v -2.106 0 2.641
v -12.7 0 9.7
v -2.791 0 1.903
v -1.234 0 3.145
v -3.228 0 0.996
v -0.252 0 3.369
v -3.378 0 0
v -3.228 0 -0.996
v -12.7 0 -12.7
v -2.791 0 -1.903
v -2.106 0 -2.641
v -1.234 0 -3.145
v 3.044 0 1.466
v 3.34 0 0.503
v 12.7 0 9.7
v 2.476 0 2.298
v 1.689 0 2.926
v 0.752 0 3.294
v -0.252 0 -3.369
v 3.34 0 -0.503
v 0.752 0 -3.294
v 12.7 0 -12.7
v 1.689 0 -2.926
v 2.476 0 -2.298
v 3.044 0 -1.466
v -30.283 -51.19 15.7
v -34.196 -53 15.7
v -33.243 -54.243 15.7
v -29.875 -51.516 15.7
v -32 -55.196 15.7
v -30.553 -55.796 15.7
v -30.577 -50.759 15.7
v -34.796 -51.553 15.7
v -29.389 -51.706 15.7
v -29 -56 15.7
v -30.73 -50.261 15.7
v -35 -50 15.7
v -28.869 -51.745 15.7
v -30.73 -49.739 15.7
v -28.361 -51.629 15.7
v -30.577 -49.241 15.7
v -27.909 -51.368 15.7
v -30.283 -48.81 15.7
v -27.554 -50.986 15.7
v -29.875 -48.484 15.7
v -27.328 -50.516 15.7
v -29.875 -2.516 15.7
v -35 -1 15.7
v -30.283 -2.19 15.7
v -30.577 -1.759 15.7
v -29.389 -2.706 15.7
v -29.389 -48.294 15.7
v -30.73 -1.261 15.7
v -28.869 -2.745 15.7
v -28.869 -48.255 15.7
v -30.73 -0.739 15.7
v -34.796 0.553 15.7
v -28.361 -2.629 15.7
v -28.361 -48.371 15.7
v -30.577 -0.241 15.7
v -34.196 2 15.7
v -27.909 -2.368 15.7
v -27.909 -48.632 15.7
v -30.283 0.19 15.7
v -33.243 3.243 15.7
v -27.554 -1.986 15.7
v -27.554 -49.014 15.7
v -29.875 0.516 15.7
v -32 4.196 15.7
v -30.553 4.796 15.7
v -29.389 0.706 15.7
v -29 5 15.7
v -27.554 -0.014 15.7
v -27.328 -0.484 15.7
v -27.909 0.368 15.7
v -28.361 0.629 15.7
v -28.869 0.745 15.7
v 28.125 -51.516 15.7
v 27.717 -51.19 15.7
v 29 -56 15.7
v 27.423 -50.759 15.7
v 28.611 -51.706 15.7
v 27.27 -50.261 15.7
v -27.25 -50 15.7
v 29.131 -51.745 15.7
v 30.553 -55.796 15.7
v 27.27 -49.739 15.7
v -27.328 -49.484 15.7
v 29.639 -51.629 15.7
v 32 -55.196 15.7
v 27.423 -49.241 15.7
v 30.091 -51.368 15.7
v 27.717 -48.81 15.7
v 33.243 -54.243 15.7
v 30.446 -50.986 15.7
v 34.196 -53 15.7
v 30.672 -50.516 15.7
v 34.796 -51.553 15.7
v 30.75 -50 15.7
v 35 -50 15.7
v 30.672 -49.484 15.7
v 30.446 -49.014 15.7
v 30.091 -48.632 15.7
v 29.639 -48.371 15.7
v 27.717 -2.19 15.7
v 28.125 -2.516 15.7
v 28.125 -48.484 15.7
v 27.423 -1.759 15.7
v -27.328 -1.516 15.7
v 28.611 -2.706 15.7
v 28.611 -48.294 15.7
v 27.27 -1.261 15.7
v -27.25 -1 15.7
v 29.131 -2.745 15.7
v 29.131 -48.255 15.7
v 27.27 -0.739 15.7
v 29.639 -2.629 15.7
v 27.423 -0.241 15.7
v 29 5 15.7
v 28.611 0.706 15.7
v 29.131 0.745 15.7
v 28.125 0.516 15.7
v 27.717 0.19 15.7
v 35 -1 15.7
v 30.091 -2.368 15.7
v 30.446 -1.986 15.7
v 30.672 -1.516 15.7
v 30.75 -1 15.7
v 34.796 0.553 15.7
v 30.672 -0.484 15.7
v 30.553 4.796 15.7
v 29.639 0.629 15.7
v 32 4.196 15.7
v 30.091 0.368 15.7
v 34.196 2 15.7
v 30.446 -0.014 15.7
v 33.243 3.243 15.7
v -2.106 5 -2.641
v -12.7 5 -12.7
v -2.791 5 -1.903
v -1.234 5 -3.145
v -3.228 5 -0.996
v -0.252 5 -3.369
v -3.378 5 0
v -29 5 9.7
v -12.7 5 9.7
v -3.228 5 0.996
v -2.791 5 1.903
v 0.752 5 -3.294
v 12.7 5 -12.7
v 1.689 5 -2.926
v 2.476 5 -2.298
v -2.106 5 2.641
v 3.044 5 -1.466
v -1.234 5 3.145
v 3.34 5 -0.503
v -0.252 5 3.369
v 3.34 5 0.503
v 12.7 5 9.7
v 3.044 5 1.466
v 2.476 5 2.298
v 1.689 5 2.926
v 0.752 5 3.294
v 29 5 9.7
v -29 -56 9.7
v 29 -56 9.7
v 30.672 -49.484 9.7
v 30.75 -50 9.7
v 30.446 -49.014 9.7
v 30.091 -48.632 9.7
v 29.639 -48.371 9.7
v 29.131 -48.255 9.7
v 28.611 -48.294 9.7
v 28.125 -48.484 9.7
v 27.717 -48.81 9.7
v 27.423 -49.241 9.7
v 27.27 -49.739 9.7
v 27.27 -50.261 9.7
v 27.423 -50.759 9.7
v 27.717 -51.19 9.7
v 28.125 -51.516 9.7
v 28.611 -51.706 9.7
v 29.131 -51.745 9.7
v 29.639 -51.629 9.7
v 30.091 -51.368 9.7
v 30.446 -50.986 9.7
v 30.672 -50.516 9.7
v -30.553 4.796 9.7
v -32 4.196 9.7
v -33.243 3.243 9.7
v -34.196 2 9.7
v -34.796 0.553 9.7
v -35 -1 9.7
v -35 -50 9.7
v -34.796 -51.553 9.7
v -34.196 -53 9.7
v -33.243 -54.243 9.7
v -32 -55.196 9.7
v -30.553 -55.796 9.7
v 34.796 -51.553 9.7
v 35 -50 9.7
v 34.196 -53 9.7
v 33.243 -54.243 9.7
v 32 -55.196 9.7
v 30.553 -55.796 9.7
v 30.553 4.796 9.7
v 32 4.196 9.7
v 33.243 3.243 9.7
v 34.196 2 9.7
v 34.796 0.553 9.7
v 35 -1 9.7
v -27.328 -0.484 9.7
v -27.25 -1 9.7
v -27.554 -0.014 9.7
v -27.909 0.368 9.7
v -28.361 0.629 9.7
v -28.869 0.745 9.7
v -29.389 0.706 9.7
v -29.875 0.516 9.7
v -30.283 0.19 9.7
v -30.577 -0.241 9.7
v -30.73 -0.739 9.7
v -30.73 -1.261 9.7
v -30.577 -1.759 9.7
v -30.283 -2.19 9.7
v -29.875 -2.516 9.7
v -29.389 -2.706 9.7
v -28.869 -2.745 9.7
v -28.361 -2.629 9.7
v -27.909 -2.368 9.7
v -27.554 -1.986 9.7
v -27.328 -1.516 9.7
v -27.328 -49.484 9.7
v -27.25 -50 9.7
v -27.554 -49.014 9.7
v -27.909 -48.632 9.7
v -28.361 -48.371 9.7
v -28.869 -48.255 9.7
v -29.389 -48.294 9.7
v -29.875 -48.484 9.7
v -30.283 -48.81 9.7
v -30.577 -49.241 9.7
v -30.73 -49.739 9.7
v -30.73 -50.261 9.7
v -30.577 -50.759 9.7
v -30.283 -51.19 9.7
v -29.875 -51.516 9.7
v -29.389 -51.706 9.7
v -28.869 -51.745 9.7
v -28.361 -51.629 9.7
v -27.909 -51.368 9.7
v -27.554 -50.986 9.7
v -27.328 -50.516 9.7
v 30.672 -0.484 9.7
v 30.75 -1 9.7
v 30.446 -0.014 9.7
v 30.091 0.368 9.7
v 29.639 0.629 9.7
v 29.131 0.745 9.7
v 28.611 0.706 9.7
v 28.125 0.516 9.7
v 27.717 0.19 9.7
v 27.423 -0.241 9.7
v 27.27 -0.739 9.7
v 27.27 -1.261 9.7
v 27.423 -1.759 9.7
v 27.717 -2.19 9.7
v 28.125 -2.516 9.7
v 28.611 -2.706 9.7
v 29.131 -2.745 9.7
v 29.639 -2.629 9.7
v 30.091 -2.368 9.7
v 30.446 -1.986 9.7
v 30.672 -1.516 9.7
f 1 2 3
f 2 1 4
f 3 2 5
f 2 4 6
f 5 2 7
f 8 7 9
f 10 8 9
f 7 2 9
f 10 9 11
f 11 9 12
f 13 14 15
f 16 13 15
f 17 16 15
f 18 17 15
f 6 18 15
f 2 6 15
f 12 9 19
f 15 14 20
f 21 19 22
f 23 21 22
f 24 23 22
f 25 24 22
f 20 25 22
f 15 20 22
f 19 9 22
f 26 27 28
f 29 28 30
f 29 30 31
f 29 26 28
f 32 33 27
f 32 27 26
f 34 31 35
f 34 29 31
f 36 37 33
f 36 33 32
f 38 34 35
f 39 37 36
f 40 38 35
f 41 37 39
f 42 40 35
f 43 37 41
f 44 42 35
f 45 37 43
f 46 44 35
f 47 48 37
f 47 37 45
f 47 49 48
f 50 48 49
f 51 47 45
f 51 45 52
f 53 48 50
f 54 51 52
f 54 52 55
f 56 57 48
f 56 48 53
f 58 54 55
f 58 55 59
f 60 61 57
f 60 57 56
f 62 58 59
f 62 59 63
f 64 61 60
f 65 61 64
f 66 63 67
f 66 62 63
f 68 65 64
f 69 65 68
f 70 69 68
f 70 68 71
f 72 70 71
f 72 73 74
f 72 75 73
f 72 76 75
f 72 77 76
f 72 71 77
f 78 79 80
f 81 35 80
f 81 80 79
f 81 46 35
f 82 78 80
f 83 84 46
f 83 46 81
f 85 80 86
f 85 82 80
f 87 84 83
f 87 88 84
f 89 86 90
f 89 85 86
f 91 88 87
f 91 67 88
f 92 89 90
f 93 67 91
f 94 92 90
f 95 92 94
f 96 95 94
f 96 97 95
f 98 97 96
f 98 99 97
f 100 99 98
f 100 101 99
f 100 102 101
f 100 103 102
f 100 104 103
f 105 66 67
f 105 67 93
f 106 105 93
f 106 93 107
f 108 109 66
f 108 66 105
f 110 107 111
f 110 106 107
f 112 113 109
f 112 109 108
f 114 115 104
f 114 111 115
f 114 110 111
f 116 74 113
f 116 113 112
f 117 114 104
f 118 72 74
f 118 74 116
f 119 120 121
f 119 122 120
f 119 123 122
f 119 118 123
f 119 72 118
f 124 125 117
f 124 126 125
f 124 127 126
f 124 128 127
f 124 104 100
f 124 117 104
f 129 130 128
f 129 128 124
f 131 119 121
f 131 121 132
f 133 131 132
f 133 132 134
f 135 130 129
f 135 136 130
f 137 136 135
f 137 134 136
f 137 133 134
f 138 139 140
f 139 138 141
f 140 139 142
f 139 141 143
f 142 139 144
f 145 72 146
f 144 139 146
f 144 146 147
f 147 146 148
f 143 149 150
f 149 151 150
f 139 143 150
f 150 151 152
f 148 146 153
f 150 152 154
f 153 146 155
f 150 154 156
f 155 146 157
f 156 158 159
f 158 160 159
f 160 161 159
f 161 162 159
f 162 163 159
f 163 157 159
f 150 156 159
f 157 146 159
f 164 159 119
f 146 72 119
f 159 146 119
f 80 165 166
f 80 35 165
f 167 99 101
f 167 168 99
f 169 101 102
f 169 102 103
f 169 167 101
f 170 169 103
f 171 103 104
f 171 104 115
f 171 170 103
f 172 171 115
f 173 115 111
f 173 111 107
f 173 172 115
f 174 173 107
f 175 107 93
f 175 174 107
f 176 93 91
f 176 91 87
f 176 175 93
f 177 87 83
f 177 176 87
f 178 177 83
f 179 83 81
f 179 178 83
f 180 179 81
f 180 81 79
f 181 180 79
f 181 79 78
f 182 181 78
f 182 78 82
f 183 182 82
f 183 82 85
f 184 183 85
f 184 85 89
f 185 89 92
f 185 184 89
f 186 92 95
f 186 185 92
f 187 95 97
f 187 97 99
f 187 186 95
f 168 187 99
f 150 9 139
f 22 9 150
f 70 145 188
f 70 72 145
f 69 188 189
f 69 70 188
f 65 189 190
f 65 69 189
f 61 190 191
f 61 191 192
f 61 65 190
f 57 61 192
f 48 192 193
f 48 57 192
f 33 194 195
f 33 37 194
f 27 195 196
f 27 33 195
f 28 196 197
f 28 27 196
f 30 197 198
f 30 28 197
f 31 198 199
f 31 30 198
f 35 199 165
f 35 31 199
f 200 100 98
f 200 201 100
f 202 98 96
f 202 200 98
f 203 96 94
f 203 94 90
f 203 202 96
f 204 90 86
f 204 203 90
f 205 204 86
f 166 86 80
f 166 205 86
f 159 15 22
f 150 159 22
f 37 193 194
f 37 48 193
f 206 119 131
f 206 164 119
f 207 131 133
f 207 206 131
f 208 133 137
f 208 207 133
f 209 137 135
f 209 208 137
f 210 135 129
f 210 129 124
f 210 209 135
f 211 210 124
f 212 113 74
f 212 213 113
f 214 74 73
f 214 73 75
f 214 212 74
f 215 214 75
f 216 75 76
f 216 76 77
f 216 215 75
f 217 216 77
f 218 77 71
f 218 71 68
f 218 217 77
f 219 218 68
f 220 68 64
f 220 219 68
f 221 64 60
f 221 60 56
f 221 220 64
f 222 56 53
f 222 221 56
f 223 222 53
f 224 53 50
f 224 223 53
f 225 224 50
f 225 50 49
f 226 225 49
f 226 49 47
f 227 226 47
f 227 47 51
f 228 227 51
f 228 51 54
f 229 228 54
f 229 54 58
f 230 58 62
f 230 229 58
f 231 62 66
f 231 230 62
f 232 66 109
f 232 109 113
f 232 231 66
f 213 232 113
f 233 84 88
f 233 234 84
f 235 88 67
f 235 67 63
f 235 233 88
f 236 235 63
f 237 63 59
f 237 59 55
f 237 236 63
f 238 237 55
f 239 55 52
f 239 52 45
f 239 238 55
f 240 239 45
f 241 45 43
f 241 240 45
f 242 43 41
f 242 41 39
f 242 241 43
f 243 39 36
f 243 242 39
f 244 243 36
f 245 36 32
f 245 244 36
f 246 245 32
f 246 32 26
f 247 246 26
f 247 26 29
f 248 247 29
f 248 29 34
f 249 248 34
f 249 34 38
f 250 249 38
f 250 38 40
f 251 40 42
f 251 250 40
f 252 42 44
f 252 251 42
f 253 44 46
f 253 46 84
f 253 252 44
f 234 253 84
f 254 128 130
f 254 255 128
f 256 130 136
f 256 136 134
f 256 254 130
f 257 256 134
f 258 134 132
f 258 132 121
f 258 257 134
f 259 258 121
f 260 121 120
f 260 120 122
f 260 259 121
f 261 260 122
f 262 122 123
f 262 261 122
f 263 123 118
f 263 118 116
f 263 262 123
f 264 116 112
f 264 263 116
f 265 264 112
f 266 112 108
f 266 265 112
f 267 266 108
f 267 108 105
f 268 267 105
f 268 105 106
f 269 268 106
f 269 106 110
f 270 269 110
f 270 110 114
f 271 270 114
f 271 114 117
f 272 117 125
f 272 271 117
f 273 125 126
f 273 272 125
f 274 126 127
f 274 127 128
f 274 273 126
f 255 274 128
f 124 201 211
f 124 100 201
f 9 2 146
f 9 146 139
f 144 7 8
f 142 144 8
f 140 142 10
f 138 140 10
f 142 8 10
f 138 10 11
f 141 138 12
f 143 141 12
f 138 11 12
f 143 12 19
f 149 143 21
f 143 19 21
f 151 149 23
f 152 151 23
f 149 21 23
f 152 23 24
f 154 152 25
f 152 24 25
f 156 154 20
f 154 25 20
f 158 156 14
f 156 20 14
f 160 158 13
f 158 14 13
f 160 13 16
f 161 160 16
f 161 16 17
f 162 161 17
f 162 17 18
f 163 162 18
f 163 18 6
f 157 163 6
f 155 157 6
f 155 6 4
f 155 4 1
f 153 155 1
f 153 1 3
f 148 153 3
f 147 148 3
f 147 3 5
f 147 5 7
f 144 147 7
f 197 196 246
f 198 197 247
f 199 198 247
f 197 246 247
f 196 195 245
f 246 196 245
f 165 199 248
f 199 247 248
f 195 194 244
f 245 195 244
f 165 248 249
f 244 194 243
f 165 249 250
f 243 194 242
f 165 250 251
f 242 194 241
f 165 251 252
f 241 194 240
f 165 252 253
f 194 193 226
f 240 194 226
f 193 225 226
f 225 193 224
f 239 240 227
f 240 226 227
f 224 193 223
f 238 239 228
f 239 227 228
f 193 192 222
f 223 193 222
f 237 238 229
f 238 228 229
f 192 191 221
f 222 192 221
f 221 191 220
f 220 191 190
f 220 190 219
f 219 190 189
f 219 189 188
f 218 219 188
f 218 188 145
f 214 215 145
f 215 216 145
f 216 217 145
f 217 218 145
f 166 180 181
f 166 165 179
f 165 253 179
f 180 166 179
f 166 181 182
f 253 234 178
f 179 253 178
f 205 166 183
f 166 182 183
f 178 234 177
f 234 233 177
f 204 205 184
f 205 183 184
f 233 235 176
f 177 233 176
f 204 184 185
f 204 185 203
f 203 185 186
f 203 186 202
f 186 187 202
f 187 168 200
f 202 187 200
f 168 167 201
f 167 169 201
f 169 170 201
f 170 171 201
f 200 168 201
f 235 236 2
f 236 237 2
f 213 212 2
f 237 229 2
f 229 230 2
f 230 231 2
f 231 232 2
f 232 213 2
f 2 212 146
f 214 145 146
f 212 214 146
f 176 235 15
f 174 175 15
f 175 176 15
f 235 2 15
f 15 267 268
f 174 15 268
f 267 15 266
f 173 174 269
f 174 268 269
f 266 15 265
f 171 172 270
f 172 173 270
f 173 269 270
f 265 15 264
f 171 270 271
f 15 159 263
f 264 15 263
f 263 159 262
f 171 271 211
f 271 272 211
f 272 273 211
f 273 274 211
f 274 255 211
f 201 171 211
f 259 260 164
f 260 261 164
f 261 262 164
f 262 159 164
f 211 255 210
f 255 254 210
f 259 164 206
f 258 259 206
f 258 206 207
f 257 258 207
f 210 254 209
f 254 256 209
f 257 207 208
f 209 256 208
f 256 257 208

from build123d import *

# Parameters (mm, degrees)
SKETCH1_W               = 25.4
SKETCH1_H               = 25.4
BOSS_EXTRUDE1_DEPTH     = 5
F_1_4_CLEARANCE_HOLE1_D = 6.7564
SKETCH4_R               = 1.75
SKETCH4_W               = 25.4
SKETCH4_H               = 5
BOSS_EXTRUDE2_DEPTH     = 3
FILLET1_R               = 6


with BuildPart() as part:
    # Sketch1 → Boss-Extrude1 (new body)
    with BuildSketch(Plane(origin=(0, 0, 0), x_dir=(1, 0, 0), z_dir=(0, 1, 0))):
        Rectangle(SKETCH1_W, SKETCH1_H)
    extrude(amount=BOSS_EXTRUDE1_DEPTH)

    # 1/4 Clearance Hole1 (through all)
    with Locations(Plane(origin=(0, 5, 0), x_dir=(1, 0, 0), z_dir=(0, 1, 0))):
        with Locations((0, 0)):
            Hole(F_1_4_CLEARANCE_HOLE1_D / 2)

    # Sketch4 → Boss-Extrude2 (add, symmetric)
    # profile 1 of 2: a face of its own
    with BuildSketch(Plane.XY.offset(12.7)):
        Polygon((-35, 5), (-35, -56), (35, -56), (35, 5), (12.7, 5), (12.7, 0), (-12.7, 0), (-12.7, 5), align=None)
        with Locations((-29, -50)):
            Circle(SKETCH4_R, mode=Mode.SUBTRACT)
        with Locations((29, -50)):
            Circle(SKETCH4_R, mode=Mode.SUBTRACT)
        with Locations((-29, -1)):
            Circle(SKETCH4_R, mode=Mode.SUBTRACT)
        with Locations((29, -1)):
            Circle(SKETCH4_R, mode=Mode.SUBTRACT)
    # profile 2 of 2: a face of its own
    with BuildSketch(Plane.XY.offset(12.7)):
        with Locations((0, 2.5)):
            Rectangle(SKETCH4_W, SKETCH4_H)
    extrude(amount=BOSS_EXTRUDE2_DEPTH, both=True)

    # Fillet1
    fillet1_edges = [part.edges().sort_by_distance(p)[0] for p in [
        (-35, 5, 12.7),
        (35, 5, 12.7),
        (35, -56, 12.7),
        (-35, -56, 12.7),
    ]]
    fillet(fillet1_edges, radius=FILLET1_R)


solid = part.part
